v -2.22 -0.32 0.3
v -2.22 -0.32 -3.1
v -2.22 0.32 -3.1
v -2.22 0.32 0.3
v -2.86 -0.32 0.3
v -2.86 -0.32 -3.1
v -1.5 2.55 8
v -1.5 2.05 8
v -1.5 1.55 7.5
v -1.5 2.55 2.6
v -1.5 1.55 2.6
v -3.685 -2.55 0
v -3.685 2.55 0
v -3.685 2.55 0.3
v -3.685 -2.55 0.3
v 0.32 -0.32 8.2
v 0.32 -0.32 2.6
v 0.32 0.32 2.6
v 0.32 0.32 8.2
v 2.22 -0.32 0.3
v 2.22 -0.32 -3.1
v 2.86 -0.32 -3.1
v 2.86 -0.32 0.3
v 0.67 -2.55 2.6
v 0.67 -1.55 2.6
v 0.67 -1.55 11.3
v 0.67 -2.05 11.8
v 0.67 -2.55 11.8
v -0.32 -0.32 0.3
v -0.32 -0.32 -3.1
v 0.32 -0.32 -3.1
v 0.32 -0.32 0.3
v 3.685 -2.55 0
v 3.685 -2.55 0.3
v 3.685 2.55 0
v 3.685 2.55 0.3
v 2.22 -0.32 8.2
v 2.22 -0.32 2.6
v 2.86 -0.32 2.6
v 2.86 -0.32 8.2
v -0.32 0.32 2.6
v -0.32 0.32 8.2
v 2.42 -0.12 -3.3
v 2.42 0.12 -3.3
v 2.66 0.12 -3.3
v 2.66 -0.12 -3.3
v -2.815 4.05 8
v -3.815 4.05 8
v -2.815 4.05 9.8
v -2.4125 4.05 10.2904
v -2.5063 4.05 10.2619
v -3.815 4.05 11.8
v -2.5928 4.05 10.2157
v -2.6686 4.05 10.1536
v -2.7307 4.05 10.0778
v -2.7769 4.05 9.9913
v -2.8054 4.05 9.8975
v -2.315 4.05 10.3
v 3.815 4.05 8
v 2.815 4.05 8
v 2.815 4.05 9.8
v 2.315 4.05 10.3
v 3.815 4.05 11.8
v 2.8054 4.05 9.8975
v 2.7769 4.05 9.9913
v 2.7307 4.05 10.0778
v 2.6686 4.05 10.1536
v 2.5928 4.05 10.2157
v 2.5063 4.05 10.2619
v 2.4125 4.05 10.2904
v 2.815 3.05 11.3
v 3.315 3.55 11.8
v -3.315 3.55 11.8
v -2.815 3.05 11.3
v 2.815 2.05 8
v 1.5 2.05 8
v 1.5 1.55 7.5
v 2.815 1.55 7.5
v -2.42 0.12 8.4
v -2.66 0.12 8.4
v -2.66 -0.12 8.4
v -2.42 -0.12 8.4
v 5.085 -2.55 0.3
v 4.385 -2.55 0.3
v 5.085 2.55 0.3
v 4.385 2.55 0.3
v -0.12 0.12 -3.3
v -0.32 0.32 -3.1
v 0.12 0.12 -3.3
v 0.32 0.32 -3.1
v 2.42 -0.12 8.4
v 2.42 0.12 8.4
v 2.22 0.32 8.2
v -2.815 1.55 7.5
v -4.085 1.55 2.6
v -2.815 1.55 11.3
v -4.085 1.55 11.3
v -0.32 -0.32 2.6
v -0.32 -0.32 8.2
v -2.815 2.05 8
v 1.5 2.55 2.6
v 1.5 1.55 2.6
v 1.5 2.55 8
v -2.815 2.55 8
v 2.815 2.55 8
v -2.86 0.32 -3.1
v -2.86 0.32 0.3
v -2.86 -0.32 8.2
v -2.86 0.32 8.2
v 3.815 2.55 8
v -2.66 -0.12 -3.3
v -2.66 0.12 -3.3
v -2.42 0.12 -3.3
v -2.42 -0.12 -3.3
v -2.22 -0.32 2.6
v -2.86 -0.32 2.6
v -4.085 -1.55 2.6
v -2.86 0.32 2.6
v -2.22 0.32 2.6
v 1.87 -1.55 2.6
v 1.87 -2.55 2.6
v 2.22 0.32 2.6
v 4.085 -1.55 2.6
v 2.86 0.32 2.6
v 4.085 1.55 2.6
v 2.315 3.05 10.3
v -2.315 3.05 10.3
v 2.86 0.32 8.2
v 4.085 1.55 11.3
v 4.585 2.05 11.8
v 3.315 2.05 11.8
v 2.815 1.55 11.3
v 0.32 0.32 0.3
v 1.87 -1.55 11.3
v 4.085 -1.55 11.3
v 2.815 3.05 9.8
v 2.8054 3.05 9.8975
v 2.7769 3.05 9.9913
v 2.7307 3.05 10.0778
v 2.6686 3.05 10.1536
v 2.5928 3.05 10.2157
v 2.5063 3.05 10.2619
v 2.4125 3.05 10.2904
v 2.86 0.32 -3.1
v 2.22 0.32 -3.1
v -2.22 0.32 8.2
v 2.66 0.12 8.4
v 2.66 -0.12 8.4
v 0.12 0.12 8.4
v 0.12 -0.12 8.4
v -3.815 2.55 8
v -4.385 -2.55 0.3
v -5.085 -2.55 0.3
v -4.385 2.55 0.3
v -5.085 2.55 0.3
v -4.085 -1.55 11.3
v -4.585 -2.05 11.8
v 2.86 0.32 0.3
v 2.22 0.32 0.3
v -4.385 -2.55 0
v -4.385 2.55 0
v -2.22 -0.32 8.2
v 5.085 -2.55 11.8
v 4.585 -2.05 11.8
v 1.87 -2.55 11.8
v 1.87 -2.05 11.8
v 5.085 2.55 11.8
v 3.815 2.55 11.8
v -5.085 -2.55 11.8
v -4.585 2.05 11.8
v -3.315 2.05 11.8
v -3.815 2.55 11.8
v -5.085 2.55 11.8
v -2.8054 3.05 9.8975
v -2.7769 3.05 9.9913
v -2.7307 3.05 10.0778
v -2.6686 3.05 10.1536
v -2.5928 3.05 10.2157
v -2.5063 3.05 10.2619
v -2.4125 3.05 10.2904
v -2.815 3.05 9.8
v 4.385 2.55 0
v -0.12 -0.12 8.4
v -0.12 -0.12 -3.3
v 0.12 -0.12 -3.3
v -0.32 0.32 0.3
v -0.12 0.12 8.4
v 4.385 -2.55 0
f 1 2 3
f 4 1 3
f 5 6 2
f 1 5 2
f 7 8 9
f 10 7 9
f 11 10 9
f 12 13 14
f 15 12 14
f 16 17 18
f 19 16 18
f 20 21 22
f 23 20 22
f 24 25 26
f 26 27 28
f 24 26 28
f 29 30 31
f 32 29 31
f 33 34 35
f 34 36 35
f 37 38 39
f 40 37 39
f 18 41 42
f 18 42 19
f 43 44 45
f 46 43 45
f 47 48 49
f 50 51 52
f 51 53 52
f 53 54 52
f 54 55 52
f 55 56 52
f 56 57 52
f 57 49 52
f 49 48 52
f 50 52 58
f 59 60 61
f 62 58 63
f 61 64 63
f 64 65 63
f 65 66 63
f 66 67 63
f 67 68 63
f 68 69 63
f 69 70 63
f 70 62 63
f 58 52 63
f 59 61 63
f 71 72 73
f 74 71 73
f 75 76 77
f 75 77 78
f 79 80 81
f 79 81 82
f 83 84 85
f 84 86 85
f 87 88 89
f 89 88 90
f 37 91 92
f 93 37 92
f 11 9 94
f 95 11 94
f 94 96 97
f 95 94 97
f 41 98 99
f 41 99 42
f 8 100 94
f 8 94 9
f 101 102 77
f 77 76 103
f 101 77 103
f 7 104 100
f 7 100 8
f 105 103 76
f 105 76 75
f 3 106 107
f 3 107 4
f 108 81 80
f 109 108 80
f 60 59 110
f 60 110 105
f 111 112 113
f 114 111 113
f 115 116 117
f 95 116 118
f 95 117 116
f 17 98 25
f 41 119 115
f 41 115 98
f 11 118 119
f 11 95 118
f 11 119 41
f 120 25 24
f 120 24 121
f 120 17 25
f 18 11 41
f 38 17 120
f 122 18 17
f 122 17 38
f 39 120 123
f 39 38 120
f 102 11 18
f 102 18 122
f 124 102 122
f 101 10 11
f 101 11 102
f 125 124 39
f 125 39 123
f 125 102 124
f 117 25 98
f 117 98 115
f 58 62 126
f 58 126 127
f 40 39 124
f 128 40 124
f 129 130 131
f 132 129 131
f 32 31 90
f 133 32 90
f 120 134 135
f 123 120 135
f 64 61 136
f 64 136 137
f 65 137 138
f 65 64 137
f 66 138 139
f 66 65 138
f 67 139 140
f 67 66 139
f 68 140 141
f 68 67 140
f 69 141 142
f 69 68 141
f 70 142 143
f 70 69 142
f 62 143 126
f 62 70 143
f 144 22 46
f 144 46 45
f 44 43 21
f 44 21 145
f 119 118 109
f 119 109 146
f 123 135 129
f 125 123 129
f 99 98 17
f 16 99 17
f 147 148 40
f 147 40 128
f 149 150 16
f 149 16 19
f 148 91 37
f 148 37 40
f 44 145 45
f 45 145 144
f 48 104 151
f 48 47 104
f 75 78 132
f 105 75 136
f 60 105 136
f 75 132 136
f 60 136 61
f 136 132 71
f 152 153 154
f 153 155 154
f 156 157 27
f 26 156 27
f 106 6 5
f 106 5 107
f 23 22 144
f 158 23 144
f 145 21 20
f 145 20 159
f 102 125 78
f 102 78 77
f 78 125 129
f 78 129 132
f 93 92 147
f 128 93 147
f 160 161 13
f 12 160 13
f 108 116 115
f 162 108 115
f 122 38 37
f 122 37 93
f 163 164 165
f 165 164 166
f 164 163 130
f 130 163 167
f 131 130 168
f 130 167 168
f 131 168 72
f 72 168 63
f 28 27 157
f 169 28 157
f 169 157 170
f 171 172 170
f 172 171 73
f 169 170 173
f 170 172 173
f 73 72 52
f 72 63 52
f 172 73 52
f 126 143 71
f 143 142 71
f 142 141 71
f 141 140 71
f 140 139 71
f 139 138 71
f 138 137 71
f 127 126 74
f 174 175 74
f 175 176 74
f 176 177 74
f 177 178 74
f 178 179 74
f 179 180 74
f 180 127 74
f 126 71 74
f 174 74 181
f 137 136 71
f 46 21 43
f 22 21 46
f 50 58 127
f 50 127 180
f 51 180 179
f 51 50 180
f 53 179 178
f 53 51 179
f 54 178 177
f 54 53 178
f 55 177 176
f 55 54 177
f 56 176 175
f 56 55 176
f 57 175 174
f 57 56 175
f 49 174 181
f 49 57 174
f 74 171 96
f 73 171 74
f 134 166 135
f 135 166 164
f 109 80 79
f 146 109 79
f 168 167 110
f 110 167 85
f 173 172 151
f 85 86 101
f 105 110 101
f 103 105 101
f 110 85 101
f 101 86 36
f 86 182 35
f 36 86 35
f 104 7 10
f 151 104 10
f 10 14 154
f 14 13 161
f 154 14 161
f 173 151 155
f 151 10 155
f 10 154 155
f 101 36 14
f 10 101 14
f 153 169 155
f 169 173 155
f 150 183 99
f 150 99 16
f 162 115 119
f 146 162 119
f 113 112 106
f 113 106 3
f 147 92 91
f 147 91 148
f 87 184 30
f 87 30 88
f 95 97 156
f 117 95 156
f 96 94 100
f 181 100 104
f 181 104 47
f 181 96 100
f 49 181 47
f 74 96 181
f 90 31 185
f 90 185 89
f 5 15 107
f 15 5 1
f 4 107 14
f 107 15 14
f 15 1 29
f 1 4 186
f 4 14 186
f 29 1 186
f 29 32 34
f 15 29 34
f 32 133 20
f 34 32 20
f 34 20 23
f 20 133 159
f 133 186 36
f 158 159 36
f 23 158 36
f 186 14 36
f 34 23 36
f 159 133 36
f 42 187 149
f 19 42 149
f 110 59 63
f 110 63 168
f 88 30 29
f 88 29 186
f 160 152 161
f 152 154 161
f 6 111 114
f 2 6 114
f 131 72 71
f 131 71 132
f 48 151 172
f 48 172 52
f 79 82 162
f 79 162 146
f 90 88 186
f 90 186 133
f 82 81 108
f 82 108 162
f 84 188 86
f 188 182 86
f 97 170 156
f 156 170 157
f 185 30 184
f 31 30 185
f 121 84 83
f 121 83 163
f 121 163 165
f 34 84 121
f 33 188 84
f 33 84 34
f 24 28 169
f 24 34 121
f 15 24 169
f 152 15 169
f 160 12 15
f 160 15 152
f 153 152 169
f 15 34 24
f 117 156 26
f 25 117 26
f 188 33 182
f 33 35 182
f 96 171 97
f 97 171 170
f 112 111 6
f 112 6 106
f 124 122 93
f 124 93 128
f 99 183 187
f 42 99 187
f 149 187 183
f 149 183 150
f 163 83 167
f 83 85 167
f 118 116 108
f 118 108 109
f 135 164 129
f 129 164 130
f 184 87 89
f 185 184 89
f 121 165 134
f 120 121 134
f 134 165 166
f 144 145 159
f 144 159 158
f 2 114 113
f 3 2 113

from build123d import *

# Parameters (mm, degrees)
EXTRUDE_1_DEPTH                    = 2.55
CUT_EXTRUDE_1_DEPTH                = 9.2
EXTRUDE_2_DEPTH                    = 3.8
SKETCH_4_W                         = 5.63
SKETCH_4_H                         = 1
CUT_EXTRUDE_2_DEPTH                = 3.8
CUT_EXTRUDE_3_REACH                = 16.445
CHAMFER_1_SIZE                     = 0.5
EXTRUDE_START                      = -3.6
SKETCH_6_W                         = 0.64
SKETCH_6_H                         = 0.64
EXTRUDE_3_DEPTH                    = 11.7
CHAMFER_2_SIZE                     = 0.2
PATTERN_LINEAR_1_COUNT             = 3
PATTERN_LINEAR_1_PITCH             = 2.54
CHAMFER_2_OF_PATTERN_LINEAR_1_SIZE = 0.2


with BuildPart() as part:
    # Эскиз1 → Бобышка-Вытянуть1 (new, symmetric)
    with BuildSketch(Plane(origin=(0, 0, 0), x_dir=(1, 0, 0), z_dir=(0, 1, 0))):
        Polygon((-3.685, -0.3), (3.685, -0.3), (3.685, 0), (4.385, 0), (4.385, -0.3), (5.085, -0.3), (5.085, -11.8), (-5.085, -11.8), (-5.085, -0.3), (-4.385, -0.3), (-4.385, 0), (-3.685, 0), align=None)
    extrude(amount=EXTRUDE_1_DEPTH, both=True)

    # Эскиз2 → Вырез-Вытянуть1 (cut)
    with BuildSketch(Plane.XY.offset(11.8)):
        Polygon((-4.085, 1.55), (-4.085, -1.55), (0.67, -1.55), (0.67, -2.55), (1.87, -2.55), (1.87, -1.55), (4.085, -1.55), (4.085, 1.55), (1.5, 1.55), (1.5, 2.55), (-1.5, 2.55), (-1.5, 1.55), align=None)
    extrude(amount=-CUT_EXTRUDE_1_DEPTH, mode=Mode.SUBTRACT)

    # Эскиз3 → Бобышка-Вытянуть2 (add)
    with BuildSketch(Plane.XY.offset(11.8)):
        Polygon((-3.815, 2.55), (-3.815, 4.05), (3.815, 4.05), (3.815, 2.55), (2.815, 2.55), (2.815, 3.05), (-2.815, 3.05), (-2.815, 2.55), align=None)
    extrude(amount=-EXTRUDE_2_DEPTH)

    # Эскиз4 → Вырез-Вытянуть2 (cut)
    with BuildSketch(Plane.XY.offset(11.8)):
        with Locations((0, 2.05)):
            Rectangle(SKETCH_4_W, SKETCH_4_H)
    extrude(amount=-CUT_EXTRUDE_2_DEPTH, mode=Mode.SUBTRACT)

    # Эскиз5 → Вырез-Вытянуть3 (cut, up to next)
    with BuildSketch(Plane(origin=(0, 4.05, 0), x_dir=(1, 0, 0), z_dir=(0, 1, 0)), mode=Mode.PRIVATE) as cut_extrude_3_sk1:
        with BuildLine():
            Line((2.815, -8), (2.815, -9.8))
            ThreePointArc((2.815, -9.8), (2.668553391, -10.153553391), (2.315, -10.3))
            Line((2.315, -10.3), (-2.315, -10.3))
            ThreePointArc((-2.315, -10.3), (-2.668553391, -10.153553391), (-2.815, -9.8))
            Line((-2.815, -9.8), (-2.815, -8))
            Line((-2.815, -8), (2.815, -8))
        make_face()
    cut_extrude_3_tool1 = extrude(cut_extrude_3_sk1.sketch, amount=-CUT_EXTRUDE_3_REACH, mode=Mode.PRIVATE) & part.part
    add(cut_extrude_3_tool1.solids().sort_by_distance((0, 4.05, 9.141324))[0], mode=Mode.SUBTRACT)

    # Фаска1
    chamfer_1_edges = [part.edges().sort_by_distance(p)[0] for p in [
        (-2.1575, 1.55, 8),
        (-4.085, 0, 11.8),
        (-1.7075, -1.55, 11.8),
        (2.9775, -1.55, 11.8),
        (4.085, 0, 11.8),
        (3.45, 1.55, 11.8),
        (-2.815, 2.3, 11.8),
        (0, 3.05, 11.8),
        (2.815, 2.3, 11.8),
        (2.1575, 1.55, 8),
        (-3.45, 1.55, 11.8),
    ]]
    chamfer(chamfer_1_edges, length=CHAMFER_1_SIZE)

    # Эскиз6 → Бобышка-Вытянуть3 (add)
    with BuildSketch(Plane.XY.offset(0.3).offset(EXTRUDE_START)):
        with Locations((2.54, 0)):
            Rectangle(SKETCH_6_W, SKETCH_6_H)
    extrude_3 = extrude(amount=EXTRUDE_3_DEPTH)

    # Фаска2
    chamfer_2_edges = [part.edges().sort_by_distance(p)[0] for p in [
        (2.54, 0.32, 8.4),
        (2.86, 0, 8.4),
        (2.54, -0.32, 8.4),
        (2.22, 0, 8.4),
        (2.22, 0, -3.3),
        (2.54, 0.32, -3.3),
        (2.86, 0, -3.3),
        (2.54, -0.32, -3.3),
    ]]
    chamfer(chamfer_2_edges, length=CHAMFER_2_SIZE)

    # Линейный массив1: Бобышка-Вытянуть3 ×3
    with Locations(*[(-i * PATTERN_LINEAR_1_PITCH, 0, 0) for i in range(1, PATTERN_LINEAR_1_COUNT)]):
        add(extrude_3)

    # Фаска2 of Линейный массив1
    chamfer_2_of_pattern_linear_1_edges = [part.edges().sort_by_distance(p)[0] for p in [
        (0, 0.32, 8.4),
        (0.32, 0, 8.4),
        (0, -0.32, 8.4),
        (-0.32, 0, 8.4),
        (-0.32, 0, -3.3),
        (0, 0.32, -3.3),
        (0.32, 0, -3.3),
        (0, -0.32, -3.3),
        (-2.54, 0.32, 8.4),
        (-2.22, 0, 8.4),
        (-2.54, -0.32, 8.4),
        (-2.86, 0, 8.4),
        (-2.86, 0, -3.3),
        (-2.54, 0.32, -3.3),
        (-2.22, 0, -3.3),
        (-2.54, -0.32, -3.3),
    ]]
    chamfer(chamfer_2_of_pattern_linear_1_edges, length=CHAMFER_2_OF_PATTERN_LINEAR_1_SIZE)


solid = part.part
